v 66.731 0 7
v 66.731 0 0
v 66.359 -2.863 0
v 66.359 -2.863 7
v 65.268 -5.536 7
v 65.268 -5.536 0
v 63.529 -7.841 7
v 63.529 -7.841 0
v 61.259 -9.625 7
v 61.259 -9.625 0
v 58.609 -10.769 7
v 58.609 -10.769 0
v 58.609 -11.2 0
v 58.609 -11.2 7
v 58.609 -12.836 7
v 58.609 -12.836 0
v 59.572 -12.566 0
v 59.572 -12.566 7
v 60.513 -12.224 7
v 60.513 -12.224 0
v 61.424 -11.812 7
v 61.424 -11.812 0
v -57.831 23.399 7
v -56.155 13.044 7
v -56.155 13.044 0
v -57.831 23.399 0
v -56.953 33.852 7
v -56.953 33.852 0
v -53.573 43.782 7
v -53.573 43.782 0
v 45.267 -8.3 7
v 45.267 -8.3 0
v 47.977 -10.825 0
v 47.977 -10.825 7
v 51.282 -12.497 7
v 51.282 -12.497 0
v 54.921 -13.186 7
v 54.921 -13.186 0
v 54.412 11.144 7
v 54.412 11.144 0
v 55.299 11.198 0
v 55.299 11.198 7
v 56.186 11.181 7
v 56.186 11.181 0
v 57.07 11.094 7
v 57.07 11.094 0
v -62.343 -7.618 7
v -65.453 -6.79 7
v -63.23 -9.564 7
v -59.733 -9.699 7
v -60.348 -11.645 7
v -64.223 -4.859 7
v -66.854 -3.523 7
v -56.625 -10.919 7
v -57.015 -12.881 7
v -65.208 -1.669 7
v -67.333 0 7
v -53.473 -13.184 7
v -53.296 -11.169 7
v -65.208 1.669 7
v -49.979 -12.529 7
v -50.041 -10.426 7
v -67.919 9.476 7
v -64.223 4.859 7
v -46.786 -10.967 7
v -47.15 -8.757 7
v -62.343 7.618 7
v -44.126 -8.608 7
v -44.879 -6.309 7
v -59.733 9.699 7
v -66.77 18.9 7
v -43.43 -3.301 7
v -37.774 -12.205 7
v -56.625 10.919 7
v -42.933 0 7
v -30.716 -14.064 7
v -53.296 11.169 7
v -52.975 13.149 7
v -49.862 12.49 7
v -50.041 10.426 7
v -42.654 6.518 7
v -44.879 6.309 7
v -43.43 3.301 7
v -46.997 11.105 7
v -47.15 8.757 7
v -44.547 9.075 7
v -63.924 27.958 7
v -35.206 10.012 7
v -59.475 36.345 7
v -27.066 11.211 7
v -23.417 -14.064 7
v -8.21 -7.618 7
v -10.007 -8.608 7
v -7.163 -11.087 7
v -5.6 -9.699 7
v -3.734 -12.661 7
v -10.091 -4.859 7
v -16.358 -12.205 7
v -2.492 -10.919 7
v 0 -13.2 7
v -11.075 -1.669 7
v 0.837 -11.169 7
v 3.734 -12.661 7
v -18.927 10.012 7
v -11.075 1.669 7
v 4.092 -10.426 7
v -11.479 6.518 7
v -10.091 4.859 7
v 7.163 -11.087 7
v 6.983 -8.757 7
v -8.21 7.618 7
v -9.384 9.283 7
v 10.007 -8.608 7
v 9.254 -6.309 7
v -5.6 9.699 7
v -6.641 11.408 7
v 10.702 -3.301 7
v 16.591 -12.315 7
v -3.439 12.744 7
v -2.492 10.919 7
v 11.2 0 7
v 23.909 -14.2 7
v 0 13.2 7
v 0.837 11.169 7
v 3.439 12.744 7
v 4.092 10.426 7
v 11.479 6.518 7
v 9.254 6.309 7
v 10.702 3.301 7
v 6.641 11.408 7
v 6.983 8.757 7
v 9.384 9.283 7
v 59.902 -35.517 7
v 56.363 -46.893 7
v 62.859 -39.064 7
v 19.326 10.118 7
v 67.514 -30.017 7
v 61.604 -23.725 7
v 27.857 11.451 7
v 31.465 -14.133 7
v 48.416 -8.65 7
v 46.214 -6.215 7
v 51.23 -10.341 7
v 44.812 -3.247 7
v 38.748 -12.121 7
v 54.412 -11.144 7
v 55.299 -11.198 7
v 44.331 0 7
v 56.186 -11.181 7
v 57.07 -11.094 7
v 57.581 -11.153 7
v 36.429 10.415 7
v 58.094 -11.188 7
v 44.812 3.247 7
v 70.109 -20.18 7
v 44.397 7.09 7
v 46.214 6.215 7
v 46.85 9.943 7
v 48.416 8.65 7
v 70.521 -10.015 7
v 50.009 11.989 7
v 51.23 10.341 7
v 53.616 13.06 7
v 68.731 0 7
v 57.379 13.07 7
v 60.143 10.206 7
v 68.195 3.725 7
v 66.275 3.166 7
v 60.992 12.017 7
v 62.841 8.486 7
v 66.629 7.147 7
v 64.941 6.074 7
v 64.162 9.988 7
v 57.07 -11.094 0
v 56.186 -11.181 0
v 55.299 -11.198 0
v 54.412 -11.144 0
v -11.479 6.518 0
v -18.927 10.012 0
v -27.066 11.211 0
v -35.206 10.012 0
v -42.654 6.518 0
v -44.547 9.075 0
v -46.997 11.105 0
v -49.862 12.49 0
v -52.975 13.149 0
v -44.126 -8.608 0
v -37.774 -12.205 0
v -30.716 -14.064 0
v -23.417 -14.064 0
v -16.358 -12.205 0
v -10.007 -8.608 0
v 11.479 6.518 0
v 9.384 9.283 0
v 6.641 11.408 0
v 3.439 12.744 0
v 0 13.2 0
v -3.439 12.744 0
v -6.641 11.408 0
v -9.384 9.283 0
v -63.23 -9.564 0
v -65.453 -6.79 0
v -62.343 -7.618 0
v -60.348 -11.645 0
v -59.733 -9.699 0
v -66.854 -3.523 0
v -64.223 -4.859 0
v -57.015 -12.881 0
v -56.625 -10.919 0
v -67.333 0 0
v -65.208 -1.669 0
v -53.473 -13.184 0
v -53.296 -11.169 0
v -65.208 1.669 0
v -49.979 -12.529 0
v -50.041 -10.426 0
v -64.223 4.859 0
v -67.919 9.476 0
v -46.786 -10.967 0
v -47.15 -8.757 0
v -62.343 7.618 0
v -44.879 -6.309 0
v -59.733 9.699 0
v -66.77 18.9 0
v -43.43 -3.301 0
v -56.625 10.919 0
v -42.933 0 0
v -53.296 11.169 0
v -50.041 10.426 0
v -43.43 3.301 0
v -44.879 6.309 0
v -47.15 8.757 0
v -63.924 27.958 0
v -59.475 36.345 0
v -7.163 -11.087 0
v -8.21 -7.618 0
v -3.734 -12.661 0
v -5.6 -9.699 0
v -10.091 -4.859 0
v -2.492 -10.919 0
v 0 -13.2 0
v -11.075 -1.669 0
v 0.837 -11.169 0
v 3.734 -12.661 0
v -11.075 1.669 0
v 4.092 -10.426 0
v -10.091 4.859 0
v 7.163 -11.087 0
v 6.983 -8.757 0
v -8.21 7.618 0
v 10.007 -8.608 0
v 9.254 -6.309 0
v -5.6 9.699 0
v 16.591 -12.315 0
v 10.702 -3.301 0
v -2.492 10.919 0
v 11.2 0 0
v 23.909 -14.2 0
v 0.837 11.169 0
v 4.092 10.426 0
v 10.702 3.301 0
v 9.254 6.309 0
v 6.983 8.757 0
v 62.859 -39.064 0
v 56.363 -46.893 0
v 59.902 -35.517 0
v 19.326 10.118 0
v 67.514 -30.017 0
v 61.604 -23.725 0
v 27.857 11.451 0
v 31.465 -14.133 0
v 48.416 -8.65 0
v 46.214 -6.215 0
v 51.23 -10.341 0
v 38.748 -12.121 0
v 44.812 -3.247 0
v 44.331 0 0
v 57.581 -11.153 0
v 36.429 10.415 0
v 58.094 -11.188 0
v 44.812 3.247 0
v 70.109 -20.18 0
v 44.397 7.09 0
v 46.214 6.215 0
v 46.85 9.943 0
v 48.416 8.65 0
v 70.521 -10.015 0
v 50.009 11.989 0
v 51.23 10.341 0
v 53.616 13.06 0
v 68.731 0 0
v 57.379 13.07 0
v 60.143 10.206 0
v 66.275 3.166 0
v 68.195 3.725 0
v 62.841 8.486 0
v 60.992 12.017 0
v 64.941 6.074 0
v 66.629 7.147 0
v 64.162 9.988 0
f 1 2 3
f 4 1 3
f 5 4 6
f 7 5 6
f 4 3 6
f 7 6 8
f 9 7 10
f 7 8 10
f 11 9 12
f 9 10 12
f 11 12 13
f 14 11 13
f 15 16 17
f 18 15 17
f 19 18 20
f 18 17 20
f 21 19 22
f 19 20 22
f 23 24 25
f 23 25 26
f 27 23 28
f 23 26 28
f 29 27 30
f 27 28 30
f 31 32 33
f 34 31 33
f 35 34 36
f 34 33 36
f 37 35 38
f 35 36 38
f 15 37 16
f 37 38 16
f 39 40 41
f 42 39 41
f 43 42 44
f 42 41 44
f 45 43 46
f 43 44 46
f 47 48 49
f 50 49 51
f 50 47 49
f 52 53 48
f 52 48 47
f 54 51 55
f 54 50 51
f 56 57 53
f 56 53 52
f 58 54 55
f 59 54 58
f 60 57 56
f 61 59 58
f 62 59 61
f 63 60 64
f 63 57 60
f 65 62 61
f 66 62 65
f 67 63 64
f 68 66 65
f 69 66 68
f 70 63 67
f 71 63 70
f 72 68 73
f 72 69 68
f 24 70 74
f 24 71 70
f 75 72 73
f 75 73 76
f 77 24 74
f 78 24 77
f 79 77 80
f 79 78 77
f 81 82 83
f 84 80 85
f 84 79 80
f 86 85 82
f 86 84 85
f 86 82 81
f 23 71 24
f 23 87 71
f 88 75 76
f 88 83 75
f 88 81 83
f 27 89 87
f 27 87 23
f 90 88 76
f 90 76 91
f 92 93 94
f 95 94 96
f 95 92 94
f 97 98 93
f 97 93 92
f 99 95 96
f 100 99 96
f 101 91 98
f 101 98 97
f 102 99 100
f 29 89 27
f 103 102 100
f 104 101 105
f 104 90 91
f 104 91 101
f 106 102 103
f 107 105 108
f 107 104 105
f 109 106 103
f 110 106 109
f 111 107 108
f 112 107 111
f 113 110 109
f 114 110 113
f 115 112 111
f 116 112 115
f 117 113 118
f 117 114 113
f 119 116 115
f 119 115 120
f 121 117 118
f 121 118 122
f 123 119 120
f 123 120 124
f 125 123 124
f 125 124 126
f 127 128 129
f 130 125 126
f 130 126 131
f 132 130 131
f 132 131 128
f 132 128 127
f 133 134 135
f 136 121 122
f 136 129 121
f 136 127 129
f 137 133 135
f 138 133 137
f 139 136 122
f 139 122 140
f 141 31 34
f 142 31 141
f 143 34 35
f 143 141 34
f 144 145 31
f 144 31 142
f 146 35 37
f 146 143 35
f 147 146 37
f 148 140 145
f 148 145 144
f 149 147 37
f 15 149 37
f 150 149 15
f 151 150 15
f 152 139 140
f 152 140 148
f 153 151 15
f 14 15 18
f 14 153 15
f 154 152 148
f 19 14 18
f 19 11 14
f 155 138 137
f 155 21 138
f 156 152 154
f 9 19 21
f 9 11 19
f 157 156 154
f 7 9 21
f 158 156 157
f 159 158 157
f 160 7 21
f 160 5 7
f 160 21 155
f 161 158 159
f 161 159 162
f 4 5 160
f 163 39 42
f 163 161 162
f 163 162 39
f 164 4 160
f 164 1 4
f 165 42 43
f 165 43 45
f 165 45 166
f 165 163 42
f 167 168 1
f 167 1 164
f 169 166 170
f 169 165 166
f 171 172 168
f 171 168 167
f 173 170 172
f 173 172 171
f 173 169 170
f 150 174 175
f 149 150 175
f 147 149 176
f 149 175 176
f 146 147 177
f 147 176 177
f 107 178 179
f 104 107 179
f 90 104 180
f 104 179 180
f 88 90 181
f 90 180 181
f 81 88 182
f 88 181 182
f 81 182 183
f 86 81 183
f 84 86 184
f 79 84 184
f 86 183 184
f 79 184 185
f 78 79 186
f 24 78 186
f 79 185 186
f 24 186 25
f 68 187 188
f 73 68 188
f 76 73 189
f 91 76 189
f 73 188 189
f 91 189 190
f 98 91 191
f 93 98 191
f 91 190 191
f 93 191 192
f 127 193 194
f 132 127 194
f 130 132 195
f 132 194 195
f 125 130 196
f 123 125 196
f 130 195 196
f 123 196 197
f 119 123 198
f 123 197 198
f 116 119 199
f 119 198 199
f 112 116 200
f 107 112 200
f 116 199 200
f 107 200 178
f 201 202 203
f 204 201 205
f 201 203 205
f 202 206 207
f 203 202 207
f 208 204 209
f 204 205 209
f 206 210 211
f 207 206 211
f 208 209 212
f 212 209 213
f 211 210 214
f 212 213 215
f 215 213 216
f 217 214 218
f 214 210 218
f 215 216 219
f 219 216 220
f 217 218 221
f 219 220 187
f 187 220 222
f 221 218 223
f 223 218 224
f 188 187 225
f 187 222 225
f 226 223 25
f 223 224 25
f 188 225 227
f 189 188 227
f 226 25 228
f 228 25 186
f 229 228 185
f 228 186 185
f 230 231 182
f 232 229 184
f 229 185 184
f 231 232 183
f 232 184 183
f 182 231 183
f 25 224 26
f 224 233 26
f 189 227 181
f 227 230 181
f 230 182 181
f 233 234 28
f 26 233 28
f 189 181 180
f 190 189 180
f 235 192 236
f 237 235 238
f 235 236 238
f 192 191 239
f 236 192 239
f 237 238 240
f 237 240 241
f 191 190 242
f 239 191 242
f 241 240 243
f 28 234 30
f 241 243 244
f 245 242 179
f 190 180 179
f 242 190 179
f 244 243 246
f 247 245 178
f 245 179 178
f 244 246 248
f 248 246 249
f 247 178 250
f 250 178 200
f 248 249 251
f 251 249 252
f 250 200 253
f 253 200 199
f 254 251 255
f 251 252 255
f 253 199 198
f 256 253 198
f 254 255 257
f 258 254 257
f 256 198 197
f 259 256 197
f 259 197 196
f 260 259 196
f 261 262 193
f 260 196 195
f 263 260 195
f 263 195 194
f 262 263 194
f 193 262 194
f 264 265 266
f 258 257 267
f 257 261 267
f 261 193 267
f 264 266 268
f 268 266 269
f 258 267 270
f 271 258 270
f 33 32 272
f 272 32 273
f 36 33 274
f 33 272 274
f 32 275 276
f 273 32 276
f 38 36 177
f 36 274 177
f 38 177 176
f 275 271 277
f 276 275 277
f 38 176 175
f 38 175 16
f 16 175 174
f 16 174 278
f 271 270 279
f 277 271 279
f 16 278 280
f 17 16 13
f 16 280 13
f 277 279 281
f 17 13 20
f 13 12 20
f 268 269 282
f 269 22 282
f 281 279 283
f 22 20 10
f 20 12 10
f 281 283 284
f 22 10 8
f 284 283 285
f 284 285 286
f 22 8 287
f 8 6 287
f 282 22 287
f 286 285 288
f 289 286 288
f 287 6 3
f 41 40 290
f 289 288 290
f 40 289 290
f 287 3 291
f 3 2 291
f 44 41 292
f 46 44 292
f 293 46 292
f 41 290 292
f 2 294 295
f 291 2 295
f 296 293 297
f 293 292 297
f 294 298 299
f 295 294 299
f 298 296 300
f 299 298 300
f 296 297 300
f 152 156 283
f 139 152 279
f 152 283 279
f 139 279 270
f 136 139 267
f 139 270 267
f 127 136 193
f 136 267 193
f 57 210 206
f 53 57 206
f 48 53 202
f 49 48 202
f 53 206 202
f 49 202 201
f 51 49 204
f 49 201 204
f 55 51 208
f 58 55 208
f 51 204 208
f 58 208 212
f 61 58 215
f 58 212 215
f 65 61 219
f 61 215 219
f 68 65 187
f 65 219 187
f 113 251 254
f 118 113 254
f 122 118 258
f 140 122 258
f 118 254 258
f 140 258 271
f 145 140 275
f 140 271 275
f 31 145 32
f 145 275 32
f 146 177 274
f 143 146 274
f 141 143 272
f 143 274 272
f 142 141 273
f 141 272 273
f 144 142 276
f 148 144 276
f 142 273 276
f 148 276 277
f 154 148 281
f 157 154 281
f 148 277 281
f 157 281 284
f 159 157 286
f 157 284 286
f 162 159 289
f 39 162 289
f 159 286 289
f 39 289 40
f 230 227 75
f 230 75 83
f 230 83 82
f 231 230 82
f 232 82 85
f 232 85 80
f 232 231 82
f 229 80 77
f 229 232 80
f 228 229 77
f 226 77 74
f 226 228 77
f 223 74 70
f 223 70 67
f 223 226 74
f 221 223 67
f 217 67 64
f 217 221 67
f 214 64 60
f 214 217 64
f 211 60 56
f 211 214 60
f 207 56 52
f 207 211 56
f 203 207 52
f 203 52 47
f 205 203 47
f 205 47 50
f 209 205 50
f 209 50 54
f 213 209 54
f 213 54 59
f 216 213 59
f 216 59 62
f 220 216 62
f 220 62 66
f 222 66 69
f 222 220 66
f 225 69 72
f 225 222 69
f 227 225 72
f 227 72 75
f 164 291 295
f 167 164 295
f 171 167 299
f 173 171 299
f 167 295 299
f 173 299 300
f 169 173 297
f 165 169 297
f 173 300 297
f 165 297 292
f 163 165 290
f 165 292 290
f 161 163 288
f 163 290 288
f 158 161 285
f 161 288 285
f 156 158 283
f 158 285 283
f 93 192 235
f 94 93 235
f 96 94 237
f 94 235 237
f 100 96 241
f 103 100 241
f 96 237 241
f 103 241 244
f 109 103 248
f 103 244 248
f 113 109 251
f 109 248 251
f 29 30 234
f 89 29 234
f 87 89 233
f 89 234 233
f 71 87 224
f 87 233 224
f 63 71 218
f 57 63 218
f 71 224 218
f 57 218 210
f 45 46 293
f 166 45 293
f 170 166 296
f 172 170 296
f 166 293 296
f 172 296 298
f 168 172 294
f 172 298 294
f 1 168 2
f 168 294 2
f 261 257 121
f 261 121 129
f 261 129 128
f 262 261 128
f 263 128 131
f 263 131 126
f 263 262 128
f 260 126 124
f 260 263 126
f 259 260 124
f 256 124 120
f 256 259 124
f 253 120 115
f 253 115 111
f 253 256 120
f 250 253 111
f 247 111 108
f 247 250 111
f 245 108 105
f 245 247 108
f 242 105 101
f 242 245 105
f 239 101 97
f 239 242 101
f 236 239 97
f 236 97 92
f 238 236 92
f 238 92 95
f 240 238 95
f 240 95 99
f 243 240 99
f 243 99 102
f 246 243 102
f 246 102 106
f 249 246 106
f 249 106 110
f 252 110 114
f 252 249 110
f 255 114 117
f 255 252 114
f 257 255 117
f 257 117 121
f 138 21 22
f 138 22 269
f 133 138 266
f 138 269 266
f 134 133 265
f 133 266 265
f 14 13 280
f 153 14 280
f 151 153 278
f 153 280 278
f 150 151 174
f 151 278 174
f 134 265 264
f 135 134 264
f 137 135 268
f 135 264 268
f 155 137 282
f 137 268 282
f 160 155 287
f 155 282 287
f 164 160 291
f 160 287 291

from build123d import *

# Parameters (mm, degrees)
F0_R     = 11.2
F1_DEPTH = 7


with BuildPart() as f1:
    # F0 (on Top) → F1 (new body)
    with BuildSketch(Plane.XY):
        with BuildLine():
            ThreePointArc((44.39689, 7.089599), (27.857047, 11.450683), (11.478691, 6.517641))
            ThreePointArc((11.478691, 6.517641), (0, 13.2), (-11.478691, 6.517641))
            ThreePointArc((-11.478691, 6.517641), (-27.06632, 11.210689), (-42.653949, 6.517641))
            ThreePointArc((-42.653949, 6.517641), (-48.387541, 11.884184), (-56.154664, 13.04421))
            ThreePointArc((-56.154664, 13.04421), (-64.155881, 8.589217), (-67.33264, 0))
            ThreePointArc((-67.33264, 0), (-58.723405, -12.37598), (-44.12584, -8.608365))
            ThreePointArc((-44.12584, -8.608365), (-27.06632, -14.299813), (-10.0068, -8.608365))
            ThreePointArc((-10.0068, -8.608365), (0, -13.2), (10.0068, -8.608365))
            ThreePointArc((10.0068, -8.608365), (27.689109, -14.41312), (45.267037, -8.299554))
            ThreePointArc((45.267037, -8.299554), (51.281831, -12.497242), (58.608726, -12.836282))
            ThreePointArc((58.608726, -12.836282), (60.045688, -12.404085), (61.424313, -11.811593))
            ThreePointArc((61.424313, -11.811593), (66.75697, -6.944556), (68.731412, 0))
            ThreePointArc((68.731412, 0), (59.223587, 12.673115), (44.39689, 7.089599))
        make_face()
        with Locations((-54.13264, 0)):
            Circle(F0_R, mode=Mode.SUBTRACT)
        Circle(F0_R, mode=Mode.SUBTRACT)
        with BuildLine():
            Line((58.608726, -10.768943), (58.608726, -11.2))
            ThreePointArc((58.608726, -11.2), (57.837567, -11.17342), (57.070069, -11.093806))
            ThreePointArc((57.070069, -11.093806), (55.742724, -11.198006), (54.412393, -11.143958))
            ThreePointArc((54.412393, -11.143958), (44.331412, 0), (54.412393, 11.143958))
            ThreePointArc((54.412393, 11.143958), (55.742724, 11.198006), (57.070069, 11.093806))
            ThreePointArc((57.070069, 11.093806), (63.977505, 7.35551), (66.731412, 0))
            ThreePointArc((66.731412, 0), (64.473054, -6.744408), (58.608726, -10.768943))
        make_face(mode=Mode.SUBTRACT)
        with BuildLine():
            ThreePointArc((-67.33264, 0), (-64.155881, 8.589217), (-56.154664, 13.04421))
            ThreePointArc((-56.154664, 13.04421), (-57.711729, 28.652134), (-53.573128, 43.781698))
            ThreePointArc((-53.573128, 43.781698), (-65.554278, 23.494092), (-67.33264, 0))
        make_face()
        with BuildLine():
            ThreePointArc((56.362603, -46.893224), (69.078735, -25.169456), (68.731412, 0))
            ThreePointArc((68.731412, 0), (66.75697, -6.944556), (61.424313, -11.811593))
            ThreePointArc((61.424313, -11.811593), (60.986371, -29.654382), (56.362603, -46.893224))
        make_face()
    extrude(amount=F1_DEPTH)


solid = f1.part
